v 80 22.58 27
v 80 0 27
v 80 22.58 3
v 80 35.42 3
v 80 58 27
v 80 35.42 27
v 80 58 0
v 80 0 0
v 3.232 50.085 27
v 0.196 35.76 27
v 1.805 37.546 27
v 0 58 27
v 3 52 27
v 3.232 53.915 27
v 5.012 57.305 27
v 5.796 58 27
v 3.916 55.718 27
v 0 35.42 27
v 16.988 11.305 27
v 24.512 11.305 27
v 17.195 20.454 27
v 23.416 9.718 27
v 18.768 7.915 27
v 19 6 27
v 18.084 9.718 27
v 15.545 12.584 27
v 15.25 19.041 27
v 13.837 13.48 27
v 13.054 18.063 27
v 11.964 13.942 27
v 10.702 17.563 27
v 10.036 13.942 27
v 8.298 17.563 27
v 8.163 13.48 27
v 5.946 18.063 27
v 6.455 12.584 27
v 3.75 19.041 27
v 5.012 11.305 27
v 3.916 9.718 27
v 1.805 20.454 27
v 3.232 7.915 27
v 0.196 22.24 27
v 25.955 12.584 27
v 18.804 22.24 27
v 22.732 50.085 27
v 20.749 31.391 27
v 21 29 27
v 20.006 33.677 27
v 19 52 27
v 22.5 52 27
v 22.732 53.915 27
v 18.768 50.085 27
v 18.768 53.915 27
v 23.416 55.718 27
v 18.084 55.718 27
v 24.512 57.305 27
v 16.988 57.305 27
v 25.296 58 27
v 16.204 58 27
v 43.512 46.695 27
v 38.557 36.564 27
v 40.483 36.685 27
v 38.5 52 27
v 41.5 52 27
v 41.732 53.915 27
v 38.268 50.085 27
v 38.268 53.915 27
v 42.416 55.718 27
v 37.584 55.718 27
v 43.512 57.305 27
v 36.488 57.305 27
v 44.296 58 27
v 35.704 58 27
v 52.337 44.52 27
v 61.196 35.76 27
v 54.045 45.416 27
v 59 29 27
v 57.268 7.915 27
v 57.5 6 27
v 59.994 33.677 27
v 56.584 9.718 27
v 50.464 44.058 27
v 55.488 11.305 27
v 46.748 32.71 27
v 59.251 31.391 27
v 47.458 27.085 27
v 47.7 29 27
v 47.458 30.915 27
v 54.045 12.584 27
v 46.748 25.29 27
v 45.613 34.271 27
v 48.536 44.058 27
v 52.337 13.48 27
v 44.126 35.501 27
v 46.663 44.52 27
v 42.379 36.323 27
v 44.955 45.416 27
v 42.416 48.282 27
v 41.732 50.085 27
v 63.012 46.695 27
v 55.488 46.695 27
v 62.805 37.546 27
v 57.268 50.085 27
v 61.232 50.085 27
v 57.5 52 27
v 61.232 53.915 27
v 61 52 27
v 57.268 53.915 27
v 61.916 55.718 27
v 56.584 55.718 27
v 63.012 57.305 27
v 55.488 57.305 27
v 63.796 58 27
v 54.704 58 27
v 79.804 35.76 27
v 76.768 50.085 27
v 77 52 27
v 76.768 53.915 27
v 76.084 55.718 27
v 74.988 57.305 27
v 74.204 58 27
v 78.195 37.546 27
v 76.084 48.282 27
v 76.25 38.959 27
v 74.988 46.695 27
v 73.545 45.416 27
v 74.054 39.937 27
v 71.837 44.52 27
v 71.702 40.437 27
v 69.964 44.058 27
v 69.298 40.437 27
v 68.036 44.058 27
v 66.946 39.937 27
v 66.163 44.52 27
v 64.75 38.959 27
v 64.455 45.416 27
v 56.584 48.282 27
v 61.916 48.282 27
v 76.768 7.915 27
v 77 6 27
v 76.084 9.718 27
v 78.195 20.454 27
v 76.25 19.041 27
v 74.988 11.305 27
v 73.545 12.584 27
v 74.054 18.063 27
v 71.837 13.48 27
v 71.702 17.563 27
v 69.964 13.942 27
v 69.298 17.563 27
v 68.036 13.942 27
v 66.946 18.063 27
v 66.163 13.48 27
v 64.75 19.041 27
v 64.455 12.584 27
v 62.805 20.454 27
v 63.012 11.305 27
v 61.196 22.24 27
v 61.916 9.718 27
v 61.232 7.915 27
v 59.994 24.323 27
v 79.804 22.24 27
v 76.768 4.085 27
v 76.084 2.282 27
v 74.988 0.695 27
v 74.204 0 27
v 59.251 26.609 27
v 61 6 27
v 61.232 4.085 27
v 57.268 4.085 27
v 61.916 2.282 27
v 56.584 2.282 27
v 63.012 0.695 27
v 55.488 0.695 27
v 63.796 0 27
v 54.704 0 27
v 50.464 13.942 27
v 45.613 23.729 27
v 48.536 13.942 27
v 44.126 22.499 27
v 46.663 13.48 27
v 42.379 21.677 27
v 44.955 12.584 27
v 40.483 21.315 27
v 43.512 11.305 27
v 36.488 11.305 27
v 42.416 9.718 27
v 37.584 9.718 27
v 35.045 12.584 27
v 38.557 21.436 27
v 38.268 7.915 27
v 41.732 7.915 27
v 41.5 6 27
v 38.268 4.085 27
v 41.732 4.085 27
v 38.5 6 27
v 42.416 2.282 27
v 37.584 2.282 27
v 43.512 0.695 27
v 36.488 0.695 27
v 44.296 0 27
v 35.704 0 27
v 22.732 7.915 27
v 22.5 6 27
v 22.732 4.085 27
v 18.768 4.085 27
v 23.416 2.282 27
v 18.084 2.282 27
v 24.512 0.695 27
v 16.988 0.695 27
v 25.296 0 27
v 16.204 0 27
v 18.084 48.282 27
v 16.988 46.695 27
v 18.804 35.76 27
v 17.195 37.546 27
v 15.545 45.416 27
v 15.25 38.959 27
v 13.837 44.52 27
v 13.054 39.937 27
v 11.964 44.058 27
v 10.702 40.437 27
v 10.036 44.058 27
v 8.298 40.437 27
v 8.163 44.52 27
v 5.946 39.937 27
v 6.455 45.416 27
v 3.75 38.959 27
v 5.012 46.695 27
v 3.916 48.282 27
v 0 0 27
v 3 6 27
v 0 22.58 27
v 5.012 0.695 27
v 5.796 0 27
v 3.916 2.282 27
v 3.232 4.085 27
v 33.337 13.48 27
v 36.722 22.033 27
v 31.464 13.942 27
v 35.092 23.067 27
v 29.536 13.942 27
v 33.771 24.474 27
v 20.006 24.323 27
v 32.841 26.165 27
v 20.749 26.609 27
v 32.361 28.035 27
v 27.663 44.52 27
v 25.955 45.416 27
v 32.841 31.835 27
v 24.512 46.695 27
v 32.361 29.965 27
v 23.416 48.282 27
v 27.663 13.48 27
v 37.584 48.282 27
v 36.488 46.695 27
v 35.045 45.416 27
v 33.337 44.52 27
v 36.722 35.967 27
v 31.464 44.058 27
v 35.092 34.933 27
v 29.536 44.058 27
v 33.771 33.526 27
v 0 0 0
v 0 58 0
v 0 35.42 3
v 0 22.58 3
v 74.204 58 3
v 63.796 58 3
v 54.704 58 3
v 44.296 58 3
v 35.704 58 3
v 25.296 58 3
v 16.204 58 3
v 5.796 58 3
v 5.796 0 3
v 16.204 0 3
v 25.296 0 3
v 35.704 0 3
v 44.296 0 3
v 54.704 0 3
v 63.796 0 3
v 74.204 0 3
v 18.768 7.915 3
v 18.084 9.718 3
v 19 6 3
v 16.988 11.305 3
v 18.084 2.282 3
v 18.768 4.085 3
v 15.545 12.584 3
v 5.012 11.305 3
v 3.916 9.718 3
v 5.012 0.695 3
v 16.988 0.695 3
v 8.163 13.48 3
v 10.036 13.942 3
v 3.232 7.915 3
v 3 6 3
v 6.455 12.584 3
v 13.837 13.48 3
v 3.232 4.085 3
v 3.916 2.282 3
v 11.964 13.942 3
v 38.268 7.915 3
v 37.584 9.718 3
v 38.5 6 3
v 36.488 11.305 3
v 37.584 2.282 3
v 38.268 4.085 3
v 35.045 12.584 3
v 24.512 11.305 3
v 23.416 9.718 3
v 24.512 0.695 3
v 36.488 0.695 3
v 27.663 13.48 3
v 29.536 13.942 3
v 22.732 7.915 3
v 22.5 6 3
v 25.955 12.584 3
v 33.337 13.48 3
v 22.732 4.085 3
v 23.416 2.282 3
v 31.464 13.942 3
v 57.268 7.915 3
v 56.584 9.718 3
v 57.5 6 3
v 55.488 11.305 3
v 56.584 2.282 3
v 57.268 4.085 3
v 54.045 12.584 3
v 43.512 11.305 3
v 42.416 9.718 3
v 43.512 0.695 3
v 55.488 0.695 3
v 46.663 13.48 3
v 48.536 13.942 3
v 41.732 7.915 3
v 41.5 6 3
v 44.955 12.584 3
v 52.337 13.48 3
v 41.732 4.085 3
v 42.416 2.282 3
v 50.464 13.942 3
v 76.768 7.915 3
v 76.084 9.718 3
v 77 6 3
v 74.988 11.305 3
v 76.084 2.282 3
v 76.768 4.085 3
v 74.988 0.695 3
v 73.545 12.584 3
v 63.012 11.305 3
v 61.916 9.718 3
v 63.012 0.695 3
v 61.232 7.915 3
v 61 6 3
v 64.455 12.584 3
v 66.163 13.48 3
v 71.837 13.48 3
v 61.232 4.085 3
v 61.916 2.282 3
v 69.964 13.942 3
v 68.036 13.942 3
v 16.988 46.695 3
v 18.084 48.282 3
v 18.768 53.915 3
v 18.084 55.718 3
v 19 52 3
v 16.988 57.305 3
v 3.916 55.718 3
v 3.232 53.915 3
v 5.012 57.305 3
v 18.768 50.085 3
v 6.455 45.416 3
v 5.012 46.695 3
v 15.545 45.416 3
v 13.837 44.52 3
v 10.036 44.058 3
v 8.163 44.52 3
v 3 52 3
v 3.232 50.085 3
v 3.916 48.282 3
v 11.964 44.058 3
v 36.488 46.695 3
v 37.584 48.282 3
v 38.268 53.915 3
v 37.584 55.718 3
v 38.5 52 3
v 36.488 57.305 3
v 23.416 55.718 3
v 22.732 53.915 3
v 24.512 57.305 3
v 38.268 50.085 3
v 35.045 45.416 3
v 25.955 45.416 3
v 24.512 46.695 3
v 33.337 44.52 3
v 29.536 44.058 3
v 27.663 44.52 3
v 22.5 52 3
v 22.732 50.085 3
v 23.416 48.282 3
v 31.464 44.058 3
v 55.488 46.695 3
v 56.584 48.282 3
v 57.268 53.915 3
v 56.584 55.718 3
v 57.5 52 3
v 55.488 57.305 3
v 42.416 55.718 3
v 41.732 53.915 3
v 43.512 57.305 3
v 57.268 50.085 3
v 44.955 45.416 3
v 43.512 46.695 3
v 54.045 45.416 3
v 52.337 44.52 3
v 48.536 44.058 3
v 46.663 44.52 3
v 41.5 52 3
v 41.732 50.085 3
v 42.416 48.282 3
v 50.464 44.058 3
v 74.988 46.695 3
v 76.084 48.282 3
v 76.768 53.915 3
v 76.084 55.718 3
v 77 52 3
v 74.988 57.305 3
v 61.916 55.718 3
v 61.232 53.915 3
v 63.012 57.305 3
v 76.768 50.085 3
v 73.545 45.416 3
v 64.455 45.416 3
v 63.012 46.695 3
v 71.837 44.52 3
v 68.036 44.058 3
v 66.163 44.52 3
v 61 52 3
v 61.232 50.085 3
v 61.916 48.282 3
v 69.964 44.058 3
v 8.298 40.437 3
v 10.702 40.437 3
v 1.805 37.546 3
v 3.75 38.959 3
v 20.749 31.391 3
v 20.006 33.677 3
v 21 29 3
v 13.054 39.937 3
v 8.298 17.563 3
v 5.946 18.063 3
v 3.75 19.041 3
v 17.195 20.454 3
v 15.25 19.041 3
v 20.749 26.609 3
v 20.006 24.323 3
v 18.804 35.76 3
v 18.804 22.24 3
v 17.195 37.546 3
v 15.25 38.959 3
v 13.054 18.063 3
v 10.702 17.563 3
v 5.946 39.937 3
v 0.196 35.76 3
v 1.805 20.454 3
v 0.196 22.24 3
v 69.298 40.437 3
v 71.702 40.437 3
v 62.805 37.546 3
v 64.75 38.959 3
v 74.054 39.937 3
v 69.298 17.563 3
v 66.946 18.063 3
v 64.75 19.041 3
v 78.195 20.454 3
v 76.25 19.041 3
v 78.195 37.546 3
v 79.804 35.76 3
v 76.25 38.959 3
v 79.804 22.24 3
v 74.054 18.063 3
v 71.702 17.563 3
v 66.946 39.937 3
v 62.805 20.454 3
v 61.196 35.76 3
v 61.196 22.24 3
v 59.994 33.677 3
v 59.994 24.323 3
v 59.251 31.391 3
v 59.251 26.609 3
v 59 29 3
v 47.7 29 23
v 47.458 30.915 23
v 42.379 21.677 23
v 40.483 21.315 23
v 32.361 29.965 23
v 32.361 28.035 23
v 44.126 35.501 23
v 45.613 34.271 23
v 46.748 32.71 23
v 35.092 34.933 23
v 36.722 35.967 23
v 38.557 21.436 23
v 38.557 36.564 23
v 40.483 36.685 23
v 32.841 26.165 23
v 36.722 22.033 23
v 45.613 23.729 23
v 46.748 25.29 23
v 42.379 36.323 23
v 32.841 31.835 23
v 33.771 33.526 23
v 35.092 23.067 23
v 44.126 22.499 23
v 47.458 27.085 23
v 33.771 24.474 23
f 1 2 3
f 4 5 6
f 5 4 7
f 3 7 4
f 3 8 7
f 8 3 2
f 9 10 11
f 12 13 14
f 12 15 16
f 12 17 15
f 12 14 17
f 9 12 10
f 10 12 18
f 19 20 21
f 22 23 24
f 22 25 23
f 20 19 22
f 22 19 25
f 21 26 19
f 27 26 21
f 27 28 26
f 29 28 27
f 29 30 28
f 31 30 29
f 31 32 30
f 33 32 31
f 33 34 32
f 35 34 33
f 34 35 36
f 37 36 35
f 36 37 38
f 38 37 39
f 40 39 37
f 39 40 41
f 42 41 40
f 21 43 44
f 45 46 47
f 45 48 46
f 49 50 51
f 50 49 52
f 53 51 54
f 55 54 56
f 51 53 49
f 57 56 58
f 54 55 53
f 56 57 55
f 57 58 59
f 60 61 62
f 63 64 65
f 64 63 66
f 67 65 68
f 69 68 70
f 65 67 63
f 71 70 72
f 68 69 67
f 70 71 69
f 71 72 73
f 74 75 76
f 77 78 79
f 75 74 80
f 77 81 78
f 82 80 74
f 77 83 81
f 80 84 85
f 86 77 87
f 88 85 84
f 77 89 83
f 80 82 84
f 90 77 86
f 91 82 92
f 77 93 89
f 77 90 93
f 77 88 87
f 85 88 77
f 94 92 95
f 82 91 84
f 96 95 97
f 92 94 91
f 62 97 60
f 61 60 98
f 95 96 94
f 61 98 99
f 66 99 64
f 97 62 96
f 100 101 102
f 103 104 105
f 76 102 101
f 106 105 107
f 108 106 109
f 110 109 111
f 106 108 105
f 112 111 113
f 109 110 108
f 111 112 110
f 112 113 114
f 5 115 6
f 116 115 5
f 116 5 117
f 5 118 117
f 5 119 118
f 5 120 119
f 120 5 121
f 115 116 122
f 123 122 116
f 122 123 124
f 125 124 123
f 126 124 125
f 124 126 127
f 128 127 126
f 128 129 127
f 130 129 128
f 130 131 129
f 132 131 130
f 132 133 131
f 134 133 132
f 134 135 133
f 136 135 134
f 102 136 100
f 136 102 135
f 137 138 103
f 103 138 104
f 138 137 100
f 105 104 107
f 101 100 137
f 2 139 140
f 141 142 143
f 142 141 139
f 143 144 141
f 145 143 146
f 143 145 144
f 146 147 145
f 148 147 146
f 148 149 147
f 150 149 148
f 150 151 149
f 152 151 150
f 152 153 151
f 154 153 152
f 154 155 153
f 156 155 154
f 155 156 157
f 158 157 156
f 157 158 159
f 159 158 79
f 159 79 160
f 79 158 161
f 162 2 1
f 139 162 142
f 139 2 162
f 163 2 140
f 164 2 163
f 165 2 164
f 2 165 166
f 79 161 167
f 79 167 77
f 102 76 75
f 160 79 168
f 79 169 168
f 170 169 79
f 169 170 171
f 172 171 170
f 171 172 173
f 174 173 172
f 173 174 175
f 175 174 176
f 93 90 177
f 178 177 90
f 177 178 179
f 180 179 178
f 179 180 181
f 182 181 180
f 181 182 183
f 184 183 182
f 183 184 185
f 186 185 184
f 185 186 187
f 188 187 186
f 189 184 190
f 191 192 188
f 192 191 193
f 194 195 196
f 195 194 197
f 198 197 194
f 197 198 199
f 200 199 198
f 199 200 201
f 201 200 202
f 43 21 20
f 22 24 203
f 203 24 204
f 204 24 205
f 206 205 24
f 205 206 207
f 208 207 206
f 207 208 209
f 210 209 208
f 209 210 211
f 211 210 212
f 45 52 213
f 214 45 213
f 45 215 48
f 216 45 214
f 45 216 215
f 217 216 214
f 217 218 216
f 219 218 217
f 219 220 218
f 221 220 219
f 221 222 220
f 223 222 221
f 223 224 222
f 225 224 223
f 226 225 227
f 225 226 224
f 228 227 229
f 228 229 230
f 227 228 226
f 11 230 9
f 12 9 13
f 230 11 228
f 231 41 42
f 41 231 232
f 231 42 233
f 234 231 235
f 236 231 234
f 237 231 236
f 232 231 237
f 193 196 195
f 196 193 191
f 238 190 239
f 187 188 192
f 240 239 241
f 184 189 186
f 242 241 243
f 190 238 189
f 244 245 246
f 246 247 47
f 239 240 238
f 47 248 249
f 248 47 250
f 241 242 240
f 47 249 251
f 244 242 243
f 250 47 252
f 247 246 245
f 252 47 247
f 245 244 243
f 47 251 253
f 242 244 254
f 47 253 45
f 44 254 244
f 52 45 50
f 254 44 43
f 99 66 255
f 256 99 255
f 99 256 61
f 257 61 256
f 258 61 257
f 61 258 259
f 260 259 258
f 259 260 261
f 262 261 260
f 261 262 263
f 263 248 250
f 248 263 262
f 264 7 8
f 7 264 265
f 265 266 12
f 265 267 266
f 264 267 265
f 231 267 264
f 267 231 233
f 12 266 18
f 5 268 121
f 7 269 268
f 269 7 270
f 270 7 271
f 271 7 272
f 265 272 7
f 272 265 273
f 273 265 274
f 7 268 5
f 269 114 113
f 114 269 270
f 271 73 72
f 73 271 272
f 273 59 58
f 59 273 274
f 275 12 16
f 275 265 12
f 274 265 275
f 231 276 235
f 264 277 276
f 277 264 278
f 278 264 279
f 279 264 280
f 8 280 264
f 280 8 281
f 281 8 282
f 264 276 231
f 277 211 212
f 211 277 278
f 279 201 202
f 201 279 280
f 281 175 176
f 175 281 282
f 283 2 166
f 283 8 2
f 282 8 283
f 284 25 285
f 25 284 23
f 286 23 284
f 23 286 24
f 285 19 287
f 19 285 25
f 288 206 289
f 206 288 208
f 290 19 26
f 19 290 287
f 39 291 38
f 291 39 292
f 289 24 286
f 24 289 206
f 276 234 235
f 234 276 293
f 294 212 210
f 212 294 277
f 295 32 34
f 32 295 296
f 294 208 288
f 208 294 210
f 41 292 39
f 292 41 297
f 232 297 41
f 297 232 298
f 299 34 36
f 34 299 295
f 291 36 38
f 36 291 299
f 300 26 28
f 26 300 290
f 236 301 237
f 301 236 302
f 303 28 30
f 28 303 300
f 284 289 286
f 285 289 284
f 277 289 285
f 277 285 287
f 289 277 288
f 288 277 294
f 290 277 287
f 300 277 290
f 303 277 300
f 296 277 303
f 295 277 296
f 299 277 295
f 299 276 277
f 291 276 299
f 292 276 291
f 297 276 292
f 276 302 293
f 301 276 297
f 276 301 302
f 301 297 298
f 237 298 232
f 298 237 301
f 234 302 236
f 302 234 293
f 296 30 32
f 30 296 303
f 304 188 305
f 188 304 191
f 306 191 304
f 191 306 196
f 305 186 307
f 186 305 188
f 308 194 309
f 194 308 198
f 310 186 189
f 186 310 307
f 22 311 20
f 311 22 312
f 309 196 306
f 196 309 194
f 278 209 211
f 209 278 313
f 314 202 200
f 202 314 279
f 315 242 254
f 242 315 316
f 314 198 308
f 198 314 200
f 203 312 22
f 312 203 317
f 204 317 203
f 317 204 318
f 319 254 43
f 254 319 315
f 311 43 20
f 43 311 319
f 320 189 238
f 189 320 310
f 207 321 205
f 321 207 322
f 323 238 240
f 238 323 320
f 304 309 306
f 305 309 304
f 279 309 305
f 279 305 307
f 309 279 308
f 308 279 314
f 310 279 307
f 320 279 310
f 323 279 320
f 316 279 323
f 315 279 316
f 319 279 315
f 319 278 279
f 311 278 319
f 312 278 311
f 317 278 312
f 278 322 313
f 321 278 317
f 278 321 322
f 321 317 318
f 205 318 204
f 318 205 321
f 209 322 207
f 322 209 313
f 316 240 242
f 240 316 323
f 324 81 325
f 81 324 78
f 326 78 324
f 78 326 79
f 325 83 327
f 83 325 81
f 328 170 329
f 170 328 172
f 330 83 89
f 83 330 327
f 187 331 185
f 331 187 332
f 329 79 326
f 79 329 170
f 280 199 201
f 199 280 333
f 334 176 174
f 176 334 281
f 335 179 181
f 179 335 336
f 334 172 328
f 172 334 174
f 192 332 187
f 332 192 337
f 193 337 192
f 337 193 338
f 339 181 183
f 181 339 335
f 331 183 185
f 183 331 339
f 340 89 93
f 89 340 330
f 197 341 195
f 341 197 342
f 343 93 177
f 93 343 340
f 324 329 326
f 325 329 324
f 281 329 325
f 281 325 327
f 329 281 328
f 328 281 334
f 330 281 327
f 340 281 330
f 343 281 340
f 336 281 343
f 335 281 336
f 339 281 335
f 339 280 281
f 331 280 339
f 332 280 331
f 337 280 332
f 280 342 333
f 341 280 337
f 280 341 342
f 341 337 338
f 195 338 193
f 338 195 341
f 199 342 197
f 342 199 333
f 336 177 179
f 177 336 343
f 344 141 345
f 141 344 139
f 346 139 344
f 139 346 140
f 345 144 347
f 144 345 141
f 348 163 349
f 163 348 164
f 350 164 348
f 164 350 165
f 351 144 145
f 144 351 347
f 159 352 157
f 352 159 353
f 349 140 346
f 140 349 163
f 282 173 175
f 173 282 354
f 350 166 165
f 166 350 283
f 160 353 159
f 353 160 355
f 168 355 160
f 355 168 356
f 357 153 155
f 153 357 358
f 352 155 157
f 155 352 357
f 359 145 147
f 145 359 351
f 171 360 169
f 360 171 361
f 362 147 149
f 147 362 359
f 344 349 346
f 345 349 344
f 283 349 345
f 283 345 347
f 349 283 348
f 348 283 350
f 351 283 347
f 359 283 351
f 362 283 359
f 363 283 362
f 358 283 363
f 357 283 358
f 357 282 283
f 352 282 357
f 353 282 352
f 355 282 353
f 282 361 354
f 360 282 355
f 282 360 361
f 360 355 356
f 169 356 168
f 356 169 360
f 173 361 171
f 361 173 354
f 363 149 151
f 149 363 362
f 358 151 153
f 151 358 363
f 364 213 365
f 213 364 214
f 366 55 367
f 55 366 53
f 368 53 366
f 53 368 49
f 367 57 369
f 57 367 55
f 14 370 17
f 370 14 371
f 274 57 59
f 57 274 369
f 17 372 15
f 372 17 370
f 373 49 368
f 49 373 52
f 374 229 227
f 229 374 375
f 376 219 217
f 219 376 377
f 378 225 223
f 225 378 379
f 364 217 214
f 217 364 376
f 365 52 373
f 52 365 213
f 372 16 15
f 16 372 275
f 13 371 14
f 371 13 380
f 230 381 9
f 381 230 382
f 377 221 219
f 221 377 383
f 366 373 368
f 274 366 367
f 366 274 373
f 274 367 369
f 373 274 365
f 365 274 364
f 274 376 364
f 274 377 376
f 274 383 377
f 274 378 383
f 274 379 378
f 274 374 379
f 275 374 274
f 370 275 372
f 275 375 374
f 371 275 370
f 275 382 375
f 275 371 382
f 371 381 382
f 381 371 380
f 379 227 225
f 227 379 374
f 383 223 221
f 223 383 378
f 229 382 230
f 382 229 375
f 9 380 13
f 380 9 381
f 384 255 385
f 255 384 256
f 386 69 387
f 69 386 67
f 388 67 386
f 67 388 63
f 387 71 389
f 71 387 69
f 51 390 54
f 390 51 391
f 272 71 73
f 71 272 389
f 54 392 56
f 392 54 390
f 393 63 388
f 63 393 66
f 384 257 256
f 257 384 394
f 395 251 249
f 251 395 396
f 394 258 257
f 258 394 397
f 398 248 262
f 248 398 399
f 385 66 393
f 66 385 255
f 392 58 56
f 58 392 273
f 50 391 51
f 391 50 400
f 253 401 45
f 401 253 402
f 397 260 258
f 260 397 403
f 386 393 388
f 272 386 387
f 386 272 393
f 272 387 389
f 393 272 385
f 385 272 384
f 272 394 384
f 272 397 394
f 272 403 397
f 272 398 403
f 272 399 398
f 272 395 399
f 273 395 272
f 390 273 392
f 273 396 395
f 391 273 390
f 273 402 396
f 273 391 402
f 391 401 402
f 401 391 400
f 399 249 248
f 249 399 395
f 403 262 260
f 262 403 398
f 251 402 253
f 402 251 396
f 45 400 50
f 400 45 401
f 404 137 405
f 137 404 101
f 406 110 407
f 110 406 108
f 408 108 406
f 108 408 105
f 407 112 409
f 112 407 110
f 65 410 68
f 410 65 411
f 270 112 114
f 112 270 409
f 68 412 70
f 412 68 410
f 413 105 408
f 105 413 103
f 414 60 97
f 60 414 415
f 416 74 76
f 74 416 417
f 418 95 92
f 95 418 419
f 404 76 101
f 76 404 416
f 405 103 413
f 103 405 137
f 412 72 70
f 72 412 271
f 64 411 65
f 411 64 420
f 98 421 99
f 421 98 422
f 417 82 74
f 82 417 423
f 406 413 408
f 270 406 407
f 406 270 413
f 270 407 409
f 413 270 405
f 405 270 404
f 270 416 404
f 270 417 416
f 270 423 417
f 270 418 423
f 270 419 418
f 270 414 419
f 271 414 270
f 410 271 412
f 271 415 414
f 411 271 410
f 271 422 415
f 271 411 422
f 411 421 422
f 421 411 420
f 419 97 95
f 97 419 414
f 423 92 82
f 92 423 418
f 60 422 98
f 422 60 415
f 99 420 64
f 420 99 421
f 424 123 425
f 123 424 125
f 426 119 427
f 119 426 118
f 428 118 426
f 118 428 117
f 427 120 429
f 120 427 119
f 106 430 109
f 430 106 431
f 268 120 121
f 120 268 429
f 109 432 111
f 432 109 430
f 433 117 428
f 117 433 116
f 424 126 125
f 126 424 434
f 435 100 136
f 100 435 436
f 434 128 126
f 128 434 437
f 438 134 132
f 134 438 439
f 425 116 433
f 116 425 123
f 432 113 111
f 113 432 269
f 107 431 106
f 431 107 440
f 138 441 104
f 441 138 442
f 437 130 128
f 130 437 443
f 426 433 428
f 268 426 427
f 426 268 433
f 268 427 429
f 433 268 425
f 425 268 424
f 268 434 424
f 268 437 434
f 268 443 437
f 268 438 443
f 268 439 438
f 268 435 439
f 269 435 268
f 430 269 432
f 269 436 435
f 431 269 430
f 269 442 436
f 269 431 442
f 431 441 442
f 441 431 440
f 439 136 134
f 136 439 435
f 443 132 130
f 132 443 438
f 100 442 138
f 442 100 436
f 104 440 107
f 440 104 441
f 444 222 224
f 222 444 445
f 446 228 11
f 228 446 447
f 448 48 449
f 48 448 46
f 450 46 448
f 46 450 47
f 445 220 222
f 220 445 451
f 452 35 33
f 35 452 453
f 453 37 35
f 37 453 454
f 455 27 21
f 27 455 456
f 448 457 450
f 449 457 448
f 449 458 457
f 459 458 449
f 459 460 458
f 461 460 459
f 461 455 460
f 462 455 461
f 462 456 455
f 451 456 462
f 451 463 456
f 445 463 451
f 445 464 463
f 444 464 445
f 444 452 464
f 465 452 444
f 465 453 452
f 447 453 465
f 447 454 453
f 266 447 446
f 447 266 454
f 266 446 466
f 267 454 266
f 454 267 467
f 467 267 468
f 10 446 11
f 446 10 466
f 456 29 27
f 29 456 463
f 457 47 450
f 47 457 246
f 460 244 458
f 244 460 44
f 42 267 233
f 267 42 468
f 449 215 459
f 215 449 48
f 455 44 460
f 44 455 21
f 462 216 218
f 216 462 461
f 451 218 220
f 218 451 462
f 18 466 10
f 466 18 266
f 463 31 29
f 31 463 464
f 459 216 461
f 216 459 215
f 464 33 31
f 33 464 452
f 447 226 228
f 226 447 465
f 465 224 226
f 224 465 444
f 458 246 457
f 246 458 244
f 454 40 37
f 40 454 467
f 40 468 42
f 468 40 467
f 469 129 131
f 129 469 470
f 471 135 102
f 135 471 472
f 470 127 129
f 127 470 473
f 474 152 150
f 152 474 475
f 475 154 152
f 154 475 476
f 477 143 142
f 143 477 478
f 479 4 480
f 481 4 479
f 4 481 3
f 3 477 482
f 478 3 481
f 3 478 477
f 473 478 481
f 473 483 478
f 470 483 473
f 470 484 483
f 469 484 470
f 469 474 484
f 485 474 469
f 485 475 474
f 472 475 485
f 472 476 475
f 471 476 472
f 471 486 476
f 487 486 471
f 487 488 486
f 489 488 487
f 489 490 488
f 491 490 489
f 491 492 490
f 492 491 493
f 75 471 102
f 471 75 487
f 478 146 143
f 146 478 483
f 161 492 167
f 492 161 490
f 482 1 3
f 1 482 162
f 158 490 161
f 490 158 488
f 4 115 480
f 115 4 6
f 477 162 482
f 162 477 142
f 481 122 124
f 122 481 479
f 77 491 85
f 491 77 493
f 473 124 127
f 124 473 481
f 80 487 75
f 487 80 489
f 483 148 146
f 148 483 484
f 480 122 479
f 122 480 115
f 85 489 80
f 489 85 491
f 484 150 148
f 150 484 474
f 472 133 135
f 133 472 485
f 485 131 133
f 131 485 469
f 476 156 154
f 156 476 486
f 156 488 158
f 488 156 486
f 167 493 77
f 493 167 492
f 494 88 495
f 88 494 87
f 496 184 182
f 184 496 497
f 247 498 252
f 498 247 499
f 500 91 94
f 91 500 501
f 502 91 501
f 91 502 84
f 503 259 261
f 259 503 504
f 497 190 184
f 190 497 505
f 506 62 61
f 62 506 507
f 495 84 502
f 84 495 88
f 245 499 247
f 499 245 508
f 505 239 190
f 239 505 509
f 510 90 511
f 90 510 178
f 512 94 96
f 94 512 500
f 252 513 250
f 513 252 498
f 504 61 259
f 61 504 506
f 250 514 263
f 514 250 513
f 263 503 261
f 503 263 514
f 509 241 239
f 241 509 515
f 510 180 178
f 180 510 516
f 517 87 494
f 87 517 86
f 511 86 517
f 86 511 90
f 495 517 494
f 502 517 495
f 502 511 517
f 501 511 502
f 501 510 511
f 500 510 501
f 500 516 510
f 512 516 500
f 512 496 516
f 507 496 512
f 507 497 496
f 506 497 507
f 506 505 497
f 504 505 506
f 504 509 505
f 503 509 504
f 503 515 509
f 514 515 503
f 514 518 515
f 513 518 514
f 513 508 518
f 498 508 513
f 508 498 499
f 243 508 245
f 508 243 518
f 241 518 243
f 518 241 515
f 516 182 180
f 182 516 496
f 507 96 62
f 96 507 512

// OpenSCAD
length = 80;
width = 58;
height = 27;

floorThickness = 3;

//Based on magnet size:
magnetBaseInnerDiameter = 15.4;
magnetHeight = 4.0;

smallCircleDiameter = 16;
smallCircleOffset = 2;
largeCircleDiameter = 23;
largeCircleOffset = 5;

spaceBetweenCircles = 3;

difference(){
    cube([length, width, height]);

    translate([smallCircleDiameter/2 + spaceBetweenCircles, smallCircleDiameter/2 - smallCircleOffset, floorThickness])
        cylinder(height - floorThickness, d=smallCircleDiameter);

    translate([length /2 - (smallCircleDiameter/2 + spaceBetweenCircles / 2), smallCircleDiameter/2 - smallCircleOffset, floorThickness])
        cylinder(height - floorThickness, d=smallCircleDiameter);
    
    translate([length /2 + (smallCircleDiameter/2 + spaceBetweenCircles / 2), smallCircleDiameter/2 - smallCircleOffset, floorThickness])
        cylinder(height - floorThickness, d=smallCircleDiameter);
    
    translate([length - (smallCircleDiameter/2 + spaceBetweenCircles), smallCircleDiameter/2 - smallCircleOffset, floorThickness])
        cylinder(height - floorThickness, d=smallCircleDiameter);
    
    
    
    
    translate([smallCircleDiameter/2 + spaceBetweenCircles, width - (smallCircleDiameter/2 - smallCircleOffset), floorThickness])
        cylinder(height - floorThickness, d=smallCircleDiameter);

    translate([length /2 - (smallCircleDiameter/2 + spaceBetweenCircles / 2), width - (smallCircleDiameter/2 - smallCircleOffset), floorThickness])
        cylinder(height - floorThickness, d=smallCircleDiameter);
    
    translate([length /2 + (smallCircleDiameter/2 + spaceBetweenCircles / 2), width - (smallCircleDiameter/2 - smallCircleOffset), floorThickness])
        cylinder(height - floorThickness, d=smallCircleDiameter);
    
    translate([length - (smallCircleDiameter/2 + spaceBetweenCircles), width - (smallCircleDiameter/2 - smallCircleOffset), floorThickness])
        cylinder(height - floorThickness, d=smallCircleDiameter);
    
    


    translate([largeCircleDiameter/2 + spaceBetweenCircles - largeCircleOffset, width/2, floorThickness])
        cylinder(height - floorThickness, d=largeCircleDiameter);

    translate([length - (largeCircleDiameter/2 + spaceBetweenCircles - largeCircleOffset), width/2, floorThickness])
        cylinder(height - floorThickness, d=largeCircleDiameter);
        
    translate([length/2, width/2, height - magnetHeight])
        cylinder(magnetHeight, d=magnetBaseInnerDiameter);
        

}
